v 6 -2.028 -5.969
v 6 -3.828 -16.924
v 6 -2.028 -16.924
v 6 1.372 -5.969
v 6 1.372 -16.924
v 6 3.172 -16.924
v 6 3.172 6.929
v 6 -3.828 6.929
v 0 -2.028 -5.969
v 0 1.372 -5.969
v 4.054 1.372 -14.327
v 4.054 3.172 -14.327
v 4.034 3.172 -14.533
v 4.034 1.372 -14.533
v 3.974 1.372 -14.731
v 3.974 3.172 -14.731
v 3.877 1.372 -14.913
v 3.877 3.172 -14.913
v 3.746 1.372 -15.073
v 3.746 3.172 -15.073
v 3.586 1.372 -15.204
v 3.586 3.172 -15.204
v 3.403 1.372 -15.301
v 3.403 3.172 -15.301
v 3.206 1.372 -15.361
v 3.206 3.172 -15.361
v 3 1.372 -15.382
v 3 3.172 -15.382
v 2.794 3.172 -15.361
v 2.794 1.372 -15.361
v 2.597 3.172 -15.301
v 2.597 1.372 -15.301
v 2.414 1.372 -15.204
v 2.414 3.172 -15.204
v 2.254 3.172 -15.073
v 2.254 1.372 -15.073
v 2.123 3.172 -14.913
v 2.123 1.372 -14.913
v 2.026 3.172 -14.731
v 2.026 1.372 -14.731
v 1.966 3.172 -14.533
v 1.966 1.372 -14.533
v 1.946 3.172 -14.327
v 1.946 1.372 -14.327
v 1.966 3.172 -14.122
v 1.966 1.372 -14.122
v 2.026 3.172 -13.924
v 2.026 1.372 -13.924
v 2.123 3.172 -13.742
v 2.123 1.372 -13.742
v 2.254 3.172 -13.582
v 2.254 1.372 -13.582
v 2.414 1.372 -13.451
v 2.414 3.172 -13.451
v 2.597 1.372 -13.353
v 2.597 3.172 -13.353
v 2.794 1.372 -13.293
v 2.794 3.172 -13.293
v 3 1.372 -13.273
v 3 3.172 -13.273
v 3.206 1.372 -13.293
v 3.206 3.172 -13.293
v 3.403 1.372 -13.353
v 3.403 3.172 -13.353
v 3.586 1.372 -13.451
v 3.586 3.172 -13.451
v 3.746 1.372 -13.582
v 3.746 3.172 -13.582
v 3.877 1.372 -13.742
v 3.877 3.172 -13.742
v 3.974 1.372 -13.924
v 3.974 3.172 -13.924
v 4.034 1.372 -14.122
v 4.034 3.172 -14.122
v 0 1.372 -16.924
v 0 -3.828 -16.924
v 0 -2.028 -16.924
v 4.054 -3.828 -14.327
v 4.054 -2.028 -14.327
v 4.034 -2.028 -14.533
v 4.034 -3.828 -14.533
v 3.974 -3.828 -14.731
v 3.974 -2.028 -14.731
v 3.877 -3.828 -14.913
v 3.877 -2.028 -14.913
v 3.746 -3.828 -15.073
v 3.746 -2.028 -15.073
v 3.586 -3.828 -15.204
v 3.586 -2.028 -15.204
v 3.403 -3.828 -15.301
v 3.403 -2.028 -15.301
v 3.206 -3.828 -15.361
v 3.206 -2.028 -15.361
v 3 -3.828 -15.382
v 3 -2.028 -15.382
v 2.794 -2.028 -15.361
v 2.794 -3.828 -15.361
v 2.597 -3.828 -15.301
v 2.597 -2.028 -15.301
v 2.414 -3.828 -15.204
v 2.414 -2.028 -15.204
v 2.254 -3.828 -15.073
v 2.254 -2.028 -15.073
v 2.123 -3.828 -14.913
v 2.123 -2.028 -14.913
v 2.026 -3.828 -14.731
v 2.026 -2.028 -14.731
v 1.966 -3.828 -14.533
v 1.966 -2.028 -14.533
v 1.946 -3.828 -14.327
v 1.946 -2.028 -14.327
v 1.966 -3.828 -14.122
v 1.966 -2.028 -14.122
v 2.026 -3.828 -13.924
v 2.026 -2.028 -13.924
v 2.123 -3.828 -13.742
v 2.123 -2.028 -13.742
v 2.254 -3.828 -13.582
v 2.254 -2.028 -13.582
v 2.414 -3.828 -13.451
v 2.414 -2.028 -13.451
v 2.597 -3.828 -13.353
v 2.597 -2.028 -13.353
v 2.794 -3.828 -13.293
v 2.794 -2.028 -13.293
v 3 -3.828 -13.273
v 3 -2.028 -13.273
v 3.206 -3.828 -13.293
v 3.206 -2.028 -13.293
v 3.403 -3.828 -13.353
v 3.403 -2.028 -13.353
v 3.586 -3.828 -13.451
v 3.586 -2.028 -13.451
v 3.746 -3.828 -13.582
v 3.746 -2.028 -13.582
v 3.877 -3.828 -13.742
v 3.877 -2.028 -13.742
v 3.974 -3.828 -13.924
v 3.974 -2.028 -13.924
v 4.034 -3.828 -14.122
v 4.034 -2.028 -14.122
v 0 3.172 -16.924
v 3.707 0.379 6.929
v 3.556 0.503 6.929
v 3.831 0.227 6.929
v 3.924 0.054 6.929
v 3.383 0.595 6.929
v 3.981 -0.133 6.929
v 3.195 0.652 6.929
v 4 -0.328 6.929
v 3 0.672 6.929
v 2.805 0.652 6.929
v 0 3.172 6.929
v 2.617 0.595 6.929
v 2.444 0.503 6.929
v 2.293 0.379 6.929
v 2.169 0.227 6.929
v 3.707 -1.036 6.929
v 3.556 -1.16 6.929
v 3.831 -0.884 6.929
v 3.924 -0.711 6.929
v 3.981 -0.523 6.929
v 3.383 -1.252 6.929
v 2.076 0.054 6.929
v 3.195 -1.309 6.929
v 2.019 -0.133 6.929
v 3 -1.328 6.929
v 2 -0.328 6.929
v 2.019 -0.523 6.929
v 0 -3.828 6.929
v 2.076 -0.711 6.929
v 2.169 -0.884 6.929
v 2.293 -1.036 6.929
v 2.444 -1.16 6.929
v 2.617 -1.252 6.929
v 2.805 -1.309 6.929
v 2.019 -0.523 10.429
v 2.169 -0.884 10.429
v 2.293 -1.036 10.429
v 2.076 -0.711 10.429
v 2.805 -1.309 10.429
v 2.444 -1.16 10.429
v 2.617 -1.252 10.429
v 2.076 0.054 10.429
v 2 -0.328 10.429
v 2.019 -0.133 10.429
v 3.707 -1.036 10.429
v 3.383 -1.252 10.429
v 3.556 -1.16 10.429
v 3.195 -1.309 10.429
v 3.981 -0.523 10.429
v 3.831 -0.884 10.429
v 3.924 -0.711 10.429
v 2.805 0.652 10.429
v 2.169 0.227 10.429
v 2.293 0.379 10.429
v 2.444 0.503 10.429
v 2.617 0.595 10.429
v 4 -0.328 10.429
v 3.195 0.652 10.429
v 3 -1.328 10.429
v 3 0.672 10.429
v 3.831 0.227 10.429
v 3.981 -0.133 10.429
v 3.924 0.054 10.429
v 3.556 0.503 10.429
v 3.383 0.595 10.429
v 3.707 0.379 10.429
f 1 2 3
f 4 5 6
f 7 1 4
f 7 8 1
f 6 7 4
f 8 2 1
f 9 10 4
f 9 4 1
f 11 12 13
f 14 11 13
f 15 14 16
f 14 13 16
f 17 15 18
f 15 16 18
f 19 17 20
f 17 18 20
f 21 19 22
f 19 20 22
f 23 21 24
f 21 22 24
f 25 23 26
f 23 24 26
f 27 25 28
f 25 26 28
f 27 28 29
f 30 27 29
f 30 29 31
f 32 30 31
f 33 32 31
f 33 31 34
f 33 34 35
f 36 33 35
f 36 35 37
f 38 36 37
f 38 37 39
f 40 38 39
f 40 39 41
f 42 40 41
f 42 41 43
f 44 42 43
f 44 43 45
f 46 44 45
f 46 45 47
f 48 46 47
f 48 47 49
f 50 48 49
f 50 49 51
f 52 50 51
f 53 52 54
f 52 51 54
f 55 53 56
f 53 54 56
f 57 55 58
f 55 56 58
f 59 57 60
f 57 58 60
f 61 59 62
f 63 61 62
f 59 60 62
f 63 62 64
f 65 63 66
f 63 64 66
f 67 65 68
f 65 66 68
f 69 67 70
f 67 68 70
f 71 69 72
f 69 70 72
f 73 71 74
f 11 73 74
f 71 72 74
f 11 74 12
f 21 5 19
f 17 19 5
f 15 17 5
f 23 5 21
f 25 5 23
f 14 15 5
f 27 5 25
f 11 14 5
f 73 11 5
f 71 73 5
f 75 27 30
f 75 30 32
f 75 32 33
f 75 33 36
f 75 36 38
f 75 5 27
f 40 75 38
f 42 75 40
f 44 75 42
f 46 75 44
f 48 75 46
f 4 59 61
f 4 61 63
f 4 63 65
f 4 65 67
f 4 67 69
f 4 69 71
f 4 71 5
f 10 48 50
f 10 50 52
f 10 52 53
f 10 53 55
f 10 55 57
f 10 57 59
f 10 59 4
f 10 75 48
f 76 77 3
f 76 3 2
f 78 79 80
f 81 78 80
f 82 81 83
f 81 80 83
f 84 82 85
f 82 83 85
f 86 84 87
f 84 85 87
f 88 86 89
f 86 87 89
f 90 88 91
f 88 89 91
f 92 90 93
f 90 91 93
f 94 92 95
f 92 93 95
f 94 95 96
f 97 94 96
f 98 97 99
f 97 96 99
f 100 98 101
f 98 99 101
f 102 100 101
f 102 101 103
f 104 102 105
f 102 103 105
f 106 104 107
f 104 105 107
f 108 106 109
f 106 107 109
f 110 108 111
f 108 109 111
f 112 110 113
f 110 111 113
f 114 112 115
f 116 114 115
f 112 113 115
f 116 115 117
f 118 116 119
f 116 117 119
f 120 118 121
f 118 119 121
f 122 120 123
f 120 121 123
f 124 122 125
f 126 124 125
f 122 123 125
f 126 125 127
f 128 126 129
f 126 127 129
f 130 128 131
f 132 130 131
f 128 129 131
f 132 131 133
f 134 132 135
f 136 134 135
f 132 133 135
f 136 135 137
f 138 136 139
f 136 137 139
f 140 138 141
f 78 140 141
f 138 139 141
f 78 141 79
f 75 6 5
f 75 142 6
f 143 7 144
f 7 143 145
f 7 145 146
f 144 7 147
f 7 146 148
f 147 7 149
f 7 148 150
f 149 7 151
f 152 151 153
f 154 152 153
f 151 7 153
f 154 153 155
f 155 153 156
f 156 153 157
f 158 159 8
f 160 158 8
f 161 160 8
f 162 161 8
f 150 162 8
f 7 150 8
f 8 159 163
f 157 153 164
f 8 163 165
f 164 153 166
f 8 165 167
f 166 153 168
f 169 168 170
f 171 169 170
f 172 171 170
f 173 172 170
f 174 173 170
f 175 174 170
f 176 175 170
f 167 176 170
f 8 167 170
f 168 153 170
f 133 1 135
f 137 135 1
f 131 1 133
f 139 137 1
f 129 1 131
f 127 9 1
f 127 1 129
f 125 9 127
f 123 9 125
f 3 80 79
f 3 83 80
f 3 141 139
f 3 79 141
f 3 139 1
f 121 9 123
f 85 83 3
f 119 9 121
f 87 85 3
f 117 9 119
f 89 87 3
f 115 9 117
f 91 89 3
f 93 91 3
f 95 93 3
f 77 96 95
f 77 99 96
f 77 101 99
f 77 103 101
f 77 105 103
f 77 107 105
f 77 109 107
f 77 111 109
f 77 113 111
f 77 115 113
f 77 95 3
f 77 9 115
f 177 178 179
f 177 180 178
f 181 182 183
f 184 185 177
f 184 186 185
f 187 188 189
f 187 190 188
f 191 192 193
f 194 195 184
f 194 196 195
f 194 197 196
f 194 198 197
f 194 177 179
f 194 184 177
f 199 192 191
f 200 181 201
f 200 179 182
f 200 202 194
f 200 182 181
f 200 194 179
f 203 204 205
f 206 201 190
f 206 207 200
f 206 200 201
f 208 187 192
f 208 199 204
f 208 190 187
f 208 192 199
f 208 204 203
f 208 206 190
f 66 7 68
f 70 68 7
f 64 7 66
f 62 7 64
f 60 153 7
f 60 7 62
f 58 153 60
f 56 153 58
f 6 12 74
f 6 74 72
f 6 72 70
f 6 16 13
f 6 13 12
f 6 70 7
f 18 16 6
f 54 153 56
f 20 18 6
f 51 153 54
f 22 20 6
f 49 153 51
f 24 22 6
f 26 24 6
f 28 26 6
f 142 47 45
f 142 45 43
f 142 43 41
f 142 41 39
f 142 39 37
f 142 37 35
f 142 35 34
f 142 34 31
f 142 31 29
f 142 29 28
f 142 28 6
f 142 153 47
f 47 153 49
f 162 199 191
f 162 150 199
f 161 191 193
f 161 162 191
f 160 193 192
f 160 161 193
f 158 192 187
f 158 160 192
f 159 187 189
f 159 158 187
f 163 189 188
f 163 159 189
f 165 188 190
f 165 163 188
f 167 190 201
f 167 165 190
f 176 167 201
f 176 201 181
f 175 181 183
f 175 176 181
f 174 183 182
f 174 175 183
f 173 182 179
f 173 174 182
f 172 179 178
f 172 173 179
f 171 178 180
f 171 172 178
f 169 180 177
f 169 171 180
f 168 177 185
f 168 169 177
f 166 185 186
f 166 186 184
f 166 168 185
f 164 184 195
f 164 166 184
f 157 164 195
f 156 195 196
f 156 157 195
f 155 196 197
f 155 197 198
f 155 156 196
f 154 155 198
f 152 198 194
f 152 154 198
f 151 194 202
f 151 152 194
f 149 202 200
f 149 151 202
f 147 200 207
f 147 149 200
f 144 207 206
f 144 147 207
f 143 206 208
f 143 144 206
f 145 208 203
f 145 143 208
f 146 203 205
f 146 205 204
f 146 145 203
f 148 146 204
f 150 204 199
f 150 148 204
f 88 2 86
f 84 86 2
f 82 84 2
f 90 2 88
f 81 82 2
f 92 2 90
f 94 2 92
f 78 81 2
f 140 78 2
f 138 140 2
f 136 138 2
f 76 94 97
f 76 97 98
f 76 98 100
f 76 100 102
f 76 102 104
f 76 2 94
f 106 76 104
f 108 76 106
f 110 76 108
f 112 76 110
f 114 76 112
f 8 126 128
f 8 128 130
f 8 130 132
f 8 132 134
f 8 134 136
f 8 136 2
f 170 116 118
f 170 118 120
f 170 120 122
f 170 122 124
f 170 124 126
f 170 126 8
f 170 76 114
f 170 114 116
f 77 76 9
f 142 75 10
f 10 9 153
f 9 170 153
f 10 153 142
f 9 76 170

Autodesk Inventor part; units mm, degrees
ref_plane "YZ Plane" through (0, 0, 0) normal (1, 0, 0) x (0, 1, 0)
ref_plane "XZ Plane" through (0, 0, 0) normal (0, 1, 0) x (-1, 0, 0)
ref_plane "XY Plane" through (0, 0, 0) normal (0, 0, 1) x (1, 0, 0)
sketch "Sketch1" plane through (0, 0, 0) normal (1, 0, 0) x (0, 1, 0)
  point P0 (0, 0)
sketch "Sketch2" plane through (0, 0, 0) normal (1, 0, 0) x (0, 1, 0)
  line L0 (3.1716, 6.9287) -> (-3.8284, 6.9287)
  line L1 (3.1716, 6.9287) -> (3.1716, -16.9242)
  line L2 (3.1716, -16.9242) -> (1.3716, -16.9242)
  line L3 (1.3716, -16.9242) -> (1.3716, -5.9694)
  line L4 (1.3716, -5.9694) -> (-2.0284, -5.9694)
  line L5 (-2.0284, -5.9694) -> (-2.0284, -16.9242)
  line L6 (-2.0284, -16.9242) -> (-3.8284, -16.9242)
  line L7 (-3.8284, -16.9242) -> (-3.8284, 6.9287)
  point P0 (0, 0)
  dimension "d0" = 7
  dimension "d2" = 1.8
  dimension "d6" = 3.4
  dimension "d8" = 1.8
extrude "Extrusion1" add sketch "Sketch2" along normal blind 6
sketch "Sketch3" plane through (0, 3.1716, 6.9287) normal (0, 1, 0) x (1, 0, 0)
  line L0 (0, 23.8529) -> (6, 23.8529) projected
  circle A0 centre (3, 32.5) radius 1
  point P0 (0, 6.9287)
  dimension "d12" = 2
extrude "Extrusion2" cut sketch "Sketch3" against normal blind 9.875
sketch "Sketch5" plane through (0, 3.1716, 6.9287) normal (0, 1, 0) x (1, 0, 0)
  point P0 (0, 6.9287)
sketch "Sketch7" plane through (0, -3.8284, 6.9287) normal (0, 0, 1) x (1, 0, 0)
  line L0 (0, 1.8) -> (0, 5.2) projected
  line L1 (0, 3.5) -> (6, 3.5)
  line L2 (6, 1.8) -> (6, 5.2) projected
  line L3 (0, 0) -> (6, 0) projected
  line L4 (3, 0) -> (3, 7)
  line L5 (2, 7) -> (4, 7) projected
  circle A0 centre (3, 3.5) radius 1
  point P0 (0, 3.8284)
  dimension "d21" = 2
extrude "Extrusion5" add sketch "Sketch7" along normal blind 3.5
sketch "Sketch8" plane through (0, 3.1716, 6.9287) normal (0, 1, 0) x (1, 0, 0)
  line L0 (0, 0) -> (0, 23.8529) projected
  line L1 (0, 21.256) -> (5.958, 21.256)
  line L2 (5.958, 21.256) -> (3, 23.8529)
  line L3 (0, 23.8529) -> (6, 23.8529) projected
  line L4 (3, 23.8529) -> (3, 17.8866)
  circle A0 centre (3, 21.256) radius 1.0543
  point P0 (0, 6.9287)
extrude "Extrusion6" cut sketch "Sketch8" against normal blind 39.2125 contours A0 L4 L1 | L1 L4 A0 | L4 A0 L1 | L1 A0 L4
properties part number "Link2"
